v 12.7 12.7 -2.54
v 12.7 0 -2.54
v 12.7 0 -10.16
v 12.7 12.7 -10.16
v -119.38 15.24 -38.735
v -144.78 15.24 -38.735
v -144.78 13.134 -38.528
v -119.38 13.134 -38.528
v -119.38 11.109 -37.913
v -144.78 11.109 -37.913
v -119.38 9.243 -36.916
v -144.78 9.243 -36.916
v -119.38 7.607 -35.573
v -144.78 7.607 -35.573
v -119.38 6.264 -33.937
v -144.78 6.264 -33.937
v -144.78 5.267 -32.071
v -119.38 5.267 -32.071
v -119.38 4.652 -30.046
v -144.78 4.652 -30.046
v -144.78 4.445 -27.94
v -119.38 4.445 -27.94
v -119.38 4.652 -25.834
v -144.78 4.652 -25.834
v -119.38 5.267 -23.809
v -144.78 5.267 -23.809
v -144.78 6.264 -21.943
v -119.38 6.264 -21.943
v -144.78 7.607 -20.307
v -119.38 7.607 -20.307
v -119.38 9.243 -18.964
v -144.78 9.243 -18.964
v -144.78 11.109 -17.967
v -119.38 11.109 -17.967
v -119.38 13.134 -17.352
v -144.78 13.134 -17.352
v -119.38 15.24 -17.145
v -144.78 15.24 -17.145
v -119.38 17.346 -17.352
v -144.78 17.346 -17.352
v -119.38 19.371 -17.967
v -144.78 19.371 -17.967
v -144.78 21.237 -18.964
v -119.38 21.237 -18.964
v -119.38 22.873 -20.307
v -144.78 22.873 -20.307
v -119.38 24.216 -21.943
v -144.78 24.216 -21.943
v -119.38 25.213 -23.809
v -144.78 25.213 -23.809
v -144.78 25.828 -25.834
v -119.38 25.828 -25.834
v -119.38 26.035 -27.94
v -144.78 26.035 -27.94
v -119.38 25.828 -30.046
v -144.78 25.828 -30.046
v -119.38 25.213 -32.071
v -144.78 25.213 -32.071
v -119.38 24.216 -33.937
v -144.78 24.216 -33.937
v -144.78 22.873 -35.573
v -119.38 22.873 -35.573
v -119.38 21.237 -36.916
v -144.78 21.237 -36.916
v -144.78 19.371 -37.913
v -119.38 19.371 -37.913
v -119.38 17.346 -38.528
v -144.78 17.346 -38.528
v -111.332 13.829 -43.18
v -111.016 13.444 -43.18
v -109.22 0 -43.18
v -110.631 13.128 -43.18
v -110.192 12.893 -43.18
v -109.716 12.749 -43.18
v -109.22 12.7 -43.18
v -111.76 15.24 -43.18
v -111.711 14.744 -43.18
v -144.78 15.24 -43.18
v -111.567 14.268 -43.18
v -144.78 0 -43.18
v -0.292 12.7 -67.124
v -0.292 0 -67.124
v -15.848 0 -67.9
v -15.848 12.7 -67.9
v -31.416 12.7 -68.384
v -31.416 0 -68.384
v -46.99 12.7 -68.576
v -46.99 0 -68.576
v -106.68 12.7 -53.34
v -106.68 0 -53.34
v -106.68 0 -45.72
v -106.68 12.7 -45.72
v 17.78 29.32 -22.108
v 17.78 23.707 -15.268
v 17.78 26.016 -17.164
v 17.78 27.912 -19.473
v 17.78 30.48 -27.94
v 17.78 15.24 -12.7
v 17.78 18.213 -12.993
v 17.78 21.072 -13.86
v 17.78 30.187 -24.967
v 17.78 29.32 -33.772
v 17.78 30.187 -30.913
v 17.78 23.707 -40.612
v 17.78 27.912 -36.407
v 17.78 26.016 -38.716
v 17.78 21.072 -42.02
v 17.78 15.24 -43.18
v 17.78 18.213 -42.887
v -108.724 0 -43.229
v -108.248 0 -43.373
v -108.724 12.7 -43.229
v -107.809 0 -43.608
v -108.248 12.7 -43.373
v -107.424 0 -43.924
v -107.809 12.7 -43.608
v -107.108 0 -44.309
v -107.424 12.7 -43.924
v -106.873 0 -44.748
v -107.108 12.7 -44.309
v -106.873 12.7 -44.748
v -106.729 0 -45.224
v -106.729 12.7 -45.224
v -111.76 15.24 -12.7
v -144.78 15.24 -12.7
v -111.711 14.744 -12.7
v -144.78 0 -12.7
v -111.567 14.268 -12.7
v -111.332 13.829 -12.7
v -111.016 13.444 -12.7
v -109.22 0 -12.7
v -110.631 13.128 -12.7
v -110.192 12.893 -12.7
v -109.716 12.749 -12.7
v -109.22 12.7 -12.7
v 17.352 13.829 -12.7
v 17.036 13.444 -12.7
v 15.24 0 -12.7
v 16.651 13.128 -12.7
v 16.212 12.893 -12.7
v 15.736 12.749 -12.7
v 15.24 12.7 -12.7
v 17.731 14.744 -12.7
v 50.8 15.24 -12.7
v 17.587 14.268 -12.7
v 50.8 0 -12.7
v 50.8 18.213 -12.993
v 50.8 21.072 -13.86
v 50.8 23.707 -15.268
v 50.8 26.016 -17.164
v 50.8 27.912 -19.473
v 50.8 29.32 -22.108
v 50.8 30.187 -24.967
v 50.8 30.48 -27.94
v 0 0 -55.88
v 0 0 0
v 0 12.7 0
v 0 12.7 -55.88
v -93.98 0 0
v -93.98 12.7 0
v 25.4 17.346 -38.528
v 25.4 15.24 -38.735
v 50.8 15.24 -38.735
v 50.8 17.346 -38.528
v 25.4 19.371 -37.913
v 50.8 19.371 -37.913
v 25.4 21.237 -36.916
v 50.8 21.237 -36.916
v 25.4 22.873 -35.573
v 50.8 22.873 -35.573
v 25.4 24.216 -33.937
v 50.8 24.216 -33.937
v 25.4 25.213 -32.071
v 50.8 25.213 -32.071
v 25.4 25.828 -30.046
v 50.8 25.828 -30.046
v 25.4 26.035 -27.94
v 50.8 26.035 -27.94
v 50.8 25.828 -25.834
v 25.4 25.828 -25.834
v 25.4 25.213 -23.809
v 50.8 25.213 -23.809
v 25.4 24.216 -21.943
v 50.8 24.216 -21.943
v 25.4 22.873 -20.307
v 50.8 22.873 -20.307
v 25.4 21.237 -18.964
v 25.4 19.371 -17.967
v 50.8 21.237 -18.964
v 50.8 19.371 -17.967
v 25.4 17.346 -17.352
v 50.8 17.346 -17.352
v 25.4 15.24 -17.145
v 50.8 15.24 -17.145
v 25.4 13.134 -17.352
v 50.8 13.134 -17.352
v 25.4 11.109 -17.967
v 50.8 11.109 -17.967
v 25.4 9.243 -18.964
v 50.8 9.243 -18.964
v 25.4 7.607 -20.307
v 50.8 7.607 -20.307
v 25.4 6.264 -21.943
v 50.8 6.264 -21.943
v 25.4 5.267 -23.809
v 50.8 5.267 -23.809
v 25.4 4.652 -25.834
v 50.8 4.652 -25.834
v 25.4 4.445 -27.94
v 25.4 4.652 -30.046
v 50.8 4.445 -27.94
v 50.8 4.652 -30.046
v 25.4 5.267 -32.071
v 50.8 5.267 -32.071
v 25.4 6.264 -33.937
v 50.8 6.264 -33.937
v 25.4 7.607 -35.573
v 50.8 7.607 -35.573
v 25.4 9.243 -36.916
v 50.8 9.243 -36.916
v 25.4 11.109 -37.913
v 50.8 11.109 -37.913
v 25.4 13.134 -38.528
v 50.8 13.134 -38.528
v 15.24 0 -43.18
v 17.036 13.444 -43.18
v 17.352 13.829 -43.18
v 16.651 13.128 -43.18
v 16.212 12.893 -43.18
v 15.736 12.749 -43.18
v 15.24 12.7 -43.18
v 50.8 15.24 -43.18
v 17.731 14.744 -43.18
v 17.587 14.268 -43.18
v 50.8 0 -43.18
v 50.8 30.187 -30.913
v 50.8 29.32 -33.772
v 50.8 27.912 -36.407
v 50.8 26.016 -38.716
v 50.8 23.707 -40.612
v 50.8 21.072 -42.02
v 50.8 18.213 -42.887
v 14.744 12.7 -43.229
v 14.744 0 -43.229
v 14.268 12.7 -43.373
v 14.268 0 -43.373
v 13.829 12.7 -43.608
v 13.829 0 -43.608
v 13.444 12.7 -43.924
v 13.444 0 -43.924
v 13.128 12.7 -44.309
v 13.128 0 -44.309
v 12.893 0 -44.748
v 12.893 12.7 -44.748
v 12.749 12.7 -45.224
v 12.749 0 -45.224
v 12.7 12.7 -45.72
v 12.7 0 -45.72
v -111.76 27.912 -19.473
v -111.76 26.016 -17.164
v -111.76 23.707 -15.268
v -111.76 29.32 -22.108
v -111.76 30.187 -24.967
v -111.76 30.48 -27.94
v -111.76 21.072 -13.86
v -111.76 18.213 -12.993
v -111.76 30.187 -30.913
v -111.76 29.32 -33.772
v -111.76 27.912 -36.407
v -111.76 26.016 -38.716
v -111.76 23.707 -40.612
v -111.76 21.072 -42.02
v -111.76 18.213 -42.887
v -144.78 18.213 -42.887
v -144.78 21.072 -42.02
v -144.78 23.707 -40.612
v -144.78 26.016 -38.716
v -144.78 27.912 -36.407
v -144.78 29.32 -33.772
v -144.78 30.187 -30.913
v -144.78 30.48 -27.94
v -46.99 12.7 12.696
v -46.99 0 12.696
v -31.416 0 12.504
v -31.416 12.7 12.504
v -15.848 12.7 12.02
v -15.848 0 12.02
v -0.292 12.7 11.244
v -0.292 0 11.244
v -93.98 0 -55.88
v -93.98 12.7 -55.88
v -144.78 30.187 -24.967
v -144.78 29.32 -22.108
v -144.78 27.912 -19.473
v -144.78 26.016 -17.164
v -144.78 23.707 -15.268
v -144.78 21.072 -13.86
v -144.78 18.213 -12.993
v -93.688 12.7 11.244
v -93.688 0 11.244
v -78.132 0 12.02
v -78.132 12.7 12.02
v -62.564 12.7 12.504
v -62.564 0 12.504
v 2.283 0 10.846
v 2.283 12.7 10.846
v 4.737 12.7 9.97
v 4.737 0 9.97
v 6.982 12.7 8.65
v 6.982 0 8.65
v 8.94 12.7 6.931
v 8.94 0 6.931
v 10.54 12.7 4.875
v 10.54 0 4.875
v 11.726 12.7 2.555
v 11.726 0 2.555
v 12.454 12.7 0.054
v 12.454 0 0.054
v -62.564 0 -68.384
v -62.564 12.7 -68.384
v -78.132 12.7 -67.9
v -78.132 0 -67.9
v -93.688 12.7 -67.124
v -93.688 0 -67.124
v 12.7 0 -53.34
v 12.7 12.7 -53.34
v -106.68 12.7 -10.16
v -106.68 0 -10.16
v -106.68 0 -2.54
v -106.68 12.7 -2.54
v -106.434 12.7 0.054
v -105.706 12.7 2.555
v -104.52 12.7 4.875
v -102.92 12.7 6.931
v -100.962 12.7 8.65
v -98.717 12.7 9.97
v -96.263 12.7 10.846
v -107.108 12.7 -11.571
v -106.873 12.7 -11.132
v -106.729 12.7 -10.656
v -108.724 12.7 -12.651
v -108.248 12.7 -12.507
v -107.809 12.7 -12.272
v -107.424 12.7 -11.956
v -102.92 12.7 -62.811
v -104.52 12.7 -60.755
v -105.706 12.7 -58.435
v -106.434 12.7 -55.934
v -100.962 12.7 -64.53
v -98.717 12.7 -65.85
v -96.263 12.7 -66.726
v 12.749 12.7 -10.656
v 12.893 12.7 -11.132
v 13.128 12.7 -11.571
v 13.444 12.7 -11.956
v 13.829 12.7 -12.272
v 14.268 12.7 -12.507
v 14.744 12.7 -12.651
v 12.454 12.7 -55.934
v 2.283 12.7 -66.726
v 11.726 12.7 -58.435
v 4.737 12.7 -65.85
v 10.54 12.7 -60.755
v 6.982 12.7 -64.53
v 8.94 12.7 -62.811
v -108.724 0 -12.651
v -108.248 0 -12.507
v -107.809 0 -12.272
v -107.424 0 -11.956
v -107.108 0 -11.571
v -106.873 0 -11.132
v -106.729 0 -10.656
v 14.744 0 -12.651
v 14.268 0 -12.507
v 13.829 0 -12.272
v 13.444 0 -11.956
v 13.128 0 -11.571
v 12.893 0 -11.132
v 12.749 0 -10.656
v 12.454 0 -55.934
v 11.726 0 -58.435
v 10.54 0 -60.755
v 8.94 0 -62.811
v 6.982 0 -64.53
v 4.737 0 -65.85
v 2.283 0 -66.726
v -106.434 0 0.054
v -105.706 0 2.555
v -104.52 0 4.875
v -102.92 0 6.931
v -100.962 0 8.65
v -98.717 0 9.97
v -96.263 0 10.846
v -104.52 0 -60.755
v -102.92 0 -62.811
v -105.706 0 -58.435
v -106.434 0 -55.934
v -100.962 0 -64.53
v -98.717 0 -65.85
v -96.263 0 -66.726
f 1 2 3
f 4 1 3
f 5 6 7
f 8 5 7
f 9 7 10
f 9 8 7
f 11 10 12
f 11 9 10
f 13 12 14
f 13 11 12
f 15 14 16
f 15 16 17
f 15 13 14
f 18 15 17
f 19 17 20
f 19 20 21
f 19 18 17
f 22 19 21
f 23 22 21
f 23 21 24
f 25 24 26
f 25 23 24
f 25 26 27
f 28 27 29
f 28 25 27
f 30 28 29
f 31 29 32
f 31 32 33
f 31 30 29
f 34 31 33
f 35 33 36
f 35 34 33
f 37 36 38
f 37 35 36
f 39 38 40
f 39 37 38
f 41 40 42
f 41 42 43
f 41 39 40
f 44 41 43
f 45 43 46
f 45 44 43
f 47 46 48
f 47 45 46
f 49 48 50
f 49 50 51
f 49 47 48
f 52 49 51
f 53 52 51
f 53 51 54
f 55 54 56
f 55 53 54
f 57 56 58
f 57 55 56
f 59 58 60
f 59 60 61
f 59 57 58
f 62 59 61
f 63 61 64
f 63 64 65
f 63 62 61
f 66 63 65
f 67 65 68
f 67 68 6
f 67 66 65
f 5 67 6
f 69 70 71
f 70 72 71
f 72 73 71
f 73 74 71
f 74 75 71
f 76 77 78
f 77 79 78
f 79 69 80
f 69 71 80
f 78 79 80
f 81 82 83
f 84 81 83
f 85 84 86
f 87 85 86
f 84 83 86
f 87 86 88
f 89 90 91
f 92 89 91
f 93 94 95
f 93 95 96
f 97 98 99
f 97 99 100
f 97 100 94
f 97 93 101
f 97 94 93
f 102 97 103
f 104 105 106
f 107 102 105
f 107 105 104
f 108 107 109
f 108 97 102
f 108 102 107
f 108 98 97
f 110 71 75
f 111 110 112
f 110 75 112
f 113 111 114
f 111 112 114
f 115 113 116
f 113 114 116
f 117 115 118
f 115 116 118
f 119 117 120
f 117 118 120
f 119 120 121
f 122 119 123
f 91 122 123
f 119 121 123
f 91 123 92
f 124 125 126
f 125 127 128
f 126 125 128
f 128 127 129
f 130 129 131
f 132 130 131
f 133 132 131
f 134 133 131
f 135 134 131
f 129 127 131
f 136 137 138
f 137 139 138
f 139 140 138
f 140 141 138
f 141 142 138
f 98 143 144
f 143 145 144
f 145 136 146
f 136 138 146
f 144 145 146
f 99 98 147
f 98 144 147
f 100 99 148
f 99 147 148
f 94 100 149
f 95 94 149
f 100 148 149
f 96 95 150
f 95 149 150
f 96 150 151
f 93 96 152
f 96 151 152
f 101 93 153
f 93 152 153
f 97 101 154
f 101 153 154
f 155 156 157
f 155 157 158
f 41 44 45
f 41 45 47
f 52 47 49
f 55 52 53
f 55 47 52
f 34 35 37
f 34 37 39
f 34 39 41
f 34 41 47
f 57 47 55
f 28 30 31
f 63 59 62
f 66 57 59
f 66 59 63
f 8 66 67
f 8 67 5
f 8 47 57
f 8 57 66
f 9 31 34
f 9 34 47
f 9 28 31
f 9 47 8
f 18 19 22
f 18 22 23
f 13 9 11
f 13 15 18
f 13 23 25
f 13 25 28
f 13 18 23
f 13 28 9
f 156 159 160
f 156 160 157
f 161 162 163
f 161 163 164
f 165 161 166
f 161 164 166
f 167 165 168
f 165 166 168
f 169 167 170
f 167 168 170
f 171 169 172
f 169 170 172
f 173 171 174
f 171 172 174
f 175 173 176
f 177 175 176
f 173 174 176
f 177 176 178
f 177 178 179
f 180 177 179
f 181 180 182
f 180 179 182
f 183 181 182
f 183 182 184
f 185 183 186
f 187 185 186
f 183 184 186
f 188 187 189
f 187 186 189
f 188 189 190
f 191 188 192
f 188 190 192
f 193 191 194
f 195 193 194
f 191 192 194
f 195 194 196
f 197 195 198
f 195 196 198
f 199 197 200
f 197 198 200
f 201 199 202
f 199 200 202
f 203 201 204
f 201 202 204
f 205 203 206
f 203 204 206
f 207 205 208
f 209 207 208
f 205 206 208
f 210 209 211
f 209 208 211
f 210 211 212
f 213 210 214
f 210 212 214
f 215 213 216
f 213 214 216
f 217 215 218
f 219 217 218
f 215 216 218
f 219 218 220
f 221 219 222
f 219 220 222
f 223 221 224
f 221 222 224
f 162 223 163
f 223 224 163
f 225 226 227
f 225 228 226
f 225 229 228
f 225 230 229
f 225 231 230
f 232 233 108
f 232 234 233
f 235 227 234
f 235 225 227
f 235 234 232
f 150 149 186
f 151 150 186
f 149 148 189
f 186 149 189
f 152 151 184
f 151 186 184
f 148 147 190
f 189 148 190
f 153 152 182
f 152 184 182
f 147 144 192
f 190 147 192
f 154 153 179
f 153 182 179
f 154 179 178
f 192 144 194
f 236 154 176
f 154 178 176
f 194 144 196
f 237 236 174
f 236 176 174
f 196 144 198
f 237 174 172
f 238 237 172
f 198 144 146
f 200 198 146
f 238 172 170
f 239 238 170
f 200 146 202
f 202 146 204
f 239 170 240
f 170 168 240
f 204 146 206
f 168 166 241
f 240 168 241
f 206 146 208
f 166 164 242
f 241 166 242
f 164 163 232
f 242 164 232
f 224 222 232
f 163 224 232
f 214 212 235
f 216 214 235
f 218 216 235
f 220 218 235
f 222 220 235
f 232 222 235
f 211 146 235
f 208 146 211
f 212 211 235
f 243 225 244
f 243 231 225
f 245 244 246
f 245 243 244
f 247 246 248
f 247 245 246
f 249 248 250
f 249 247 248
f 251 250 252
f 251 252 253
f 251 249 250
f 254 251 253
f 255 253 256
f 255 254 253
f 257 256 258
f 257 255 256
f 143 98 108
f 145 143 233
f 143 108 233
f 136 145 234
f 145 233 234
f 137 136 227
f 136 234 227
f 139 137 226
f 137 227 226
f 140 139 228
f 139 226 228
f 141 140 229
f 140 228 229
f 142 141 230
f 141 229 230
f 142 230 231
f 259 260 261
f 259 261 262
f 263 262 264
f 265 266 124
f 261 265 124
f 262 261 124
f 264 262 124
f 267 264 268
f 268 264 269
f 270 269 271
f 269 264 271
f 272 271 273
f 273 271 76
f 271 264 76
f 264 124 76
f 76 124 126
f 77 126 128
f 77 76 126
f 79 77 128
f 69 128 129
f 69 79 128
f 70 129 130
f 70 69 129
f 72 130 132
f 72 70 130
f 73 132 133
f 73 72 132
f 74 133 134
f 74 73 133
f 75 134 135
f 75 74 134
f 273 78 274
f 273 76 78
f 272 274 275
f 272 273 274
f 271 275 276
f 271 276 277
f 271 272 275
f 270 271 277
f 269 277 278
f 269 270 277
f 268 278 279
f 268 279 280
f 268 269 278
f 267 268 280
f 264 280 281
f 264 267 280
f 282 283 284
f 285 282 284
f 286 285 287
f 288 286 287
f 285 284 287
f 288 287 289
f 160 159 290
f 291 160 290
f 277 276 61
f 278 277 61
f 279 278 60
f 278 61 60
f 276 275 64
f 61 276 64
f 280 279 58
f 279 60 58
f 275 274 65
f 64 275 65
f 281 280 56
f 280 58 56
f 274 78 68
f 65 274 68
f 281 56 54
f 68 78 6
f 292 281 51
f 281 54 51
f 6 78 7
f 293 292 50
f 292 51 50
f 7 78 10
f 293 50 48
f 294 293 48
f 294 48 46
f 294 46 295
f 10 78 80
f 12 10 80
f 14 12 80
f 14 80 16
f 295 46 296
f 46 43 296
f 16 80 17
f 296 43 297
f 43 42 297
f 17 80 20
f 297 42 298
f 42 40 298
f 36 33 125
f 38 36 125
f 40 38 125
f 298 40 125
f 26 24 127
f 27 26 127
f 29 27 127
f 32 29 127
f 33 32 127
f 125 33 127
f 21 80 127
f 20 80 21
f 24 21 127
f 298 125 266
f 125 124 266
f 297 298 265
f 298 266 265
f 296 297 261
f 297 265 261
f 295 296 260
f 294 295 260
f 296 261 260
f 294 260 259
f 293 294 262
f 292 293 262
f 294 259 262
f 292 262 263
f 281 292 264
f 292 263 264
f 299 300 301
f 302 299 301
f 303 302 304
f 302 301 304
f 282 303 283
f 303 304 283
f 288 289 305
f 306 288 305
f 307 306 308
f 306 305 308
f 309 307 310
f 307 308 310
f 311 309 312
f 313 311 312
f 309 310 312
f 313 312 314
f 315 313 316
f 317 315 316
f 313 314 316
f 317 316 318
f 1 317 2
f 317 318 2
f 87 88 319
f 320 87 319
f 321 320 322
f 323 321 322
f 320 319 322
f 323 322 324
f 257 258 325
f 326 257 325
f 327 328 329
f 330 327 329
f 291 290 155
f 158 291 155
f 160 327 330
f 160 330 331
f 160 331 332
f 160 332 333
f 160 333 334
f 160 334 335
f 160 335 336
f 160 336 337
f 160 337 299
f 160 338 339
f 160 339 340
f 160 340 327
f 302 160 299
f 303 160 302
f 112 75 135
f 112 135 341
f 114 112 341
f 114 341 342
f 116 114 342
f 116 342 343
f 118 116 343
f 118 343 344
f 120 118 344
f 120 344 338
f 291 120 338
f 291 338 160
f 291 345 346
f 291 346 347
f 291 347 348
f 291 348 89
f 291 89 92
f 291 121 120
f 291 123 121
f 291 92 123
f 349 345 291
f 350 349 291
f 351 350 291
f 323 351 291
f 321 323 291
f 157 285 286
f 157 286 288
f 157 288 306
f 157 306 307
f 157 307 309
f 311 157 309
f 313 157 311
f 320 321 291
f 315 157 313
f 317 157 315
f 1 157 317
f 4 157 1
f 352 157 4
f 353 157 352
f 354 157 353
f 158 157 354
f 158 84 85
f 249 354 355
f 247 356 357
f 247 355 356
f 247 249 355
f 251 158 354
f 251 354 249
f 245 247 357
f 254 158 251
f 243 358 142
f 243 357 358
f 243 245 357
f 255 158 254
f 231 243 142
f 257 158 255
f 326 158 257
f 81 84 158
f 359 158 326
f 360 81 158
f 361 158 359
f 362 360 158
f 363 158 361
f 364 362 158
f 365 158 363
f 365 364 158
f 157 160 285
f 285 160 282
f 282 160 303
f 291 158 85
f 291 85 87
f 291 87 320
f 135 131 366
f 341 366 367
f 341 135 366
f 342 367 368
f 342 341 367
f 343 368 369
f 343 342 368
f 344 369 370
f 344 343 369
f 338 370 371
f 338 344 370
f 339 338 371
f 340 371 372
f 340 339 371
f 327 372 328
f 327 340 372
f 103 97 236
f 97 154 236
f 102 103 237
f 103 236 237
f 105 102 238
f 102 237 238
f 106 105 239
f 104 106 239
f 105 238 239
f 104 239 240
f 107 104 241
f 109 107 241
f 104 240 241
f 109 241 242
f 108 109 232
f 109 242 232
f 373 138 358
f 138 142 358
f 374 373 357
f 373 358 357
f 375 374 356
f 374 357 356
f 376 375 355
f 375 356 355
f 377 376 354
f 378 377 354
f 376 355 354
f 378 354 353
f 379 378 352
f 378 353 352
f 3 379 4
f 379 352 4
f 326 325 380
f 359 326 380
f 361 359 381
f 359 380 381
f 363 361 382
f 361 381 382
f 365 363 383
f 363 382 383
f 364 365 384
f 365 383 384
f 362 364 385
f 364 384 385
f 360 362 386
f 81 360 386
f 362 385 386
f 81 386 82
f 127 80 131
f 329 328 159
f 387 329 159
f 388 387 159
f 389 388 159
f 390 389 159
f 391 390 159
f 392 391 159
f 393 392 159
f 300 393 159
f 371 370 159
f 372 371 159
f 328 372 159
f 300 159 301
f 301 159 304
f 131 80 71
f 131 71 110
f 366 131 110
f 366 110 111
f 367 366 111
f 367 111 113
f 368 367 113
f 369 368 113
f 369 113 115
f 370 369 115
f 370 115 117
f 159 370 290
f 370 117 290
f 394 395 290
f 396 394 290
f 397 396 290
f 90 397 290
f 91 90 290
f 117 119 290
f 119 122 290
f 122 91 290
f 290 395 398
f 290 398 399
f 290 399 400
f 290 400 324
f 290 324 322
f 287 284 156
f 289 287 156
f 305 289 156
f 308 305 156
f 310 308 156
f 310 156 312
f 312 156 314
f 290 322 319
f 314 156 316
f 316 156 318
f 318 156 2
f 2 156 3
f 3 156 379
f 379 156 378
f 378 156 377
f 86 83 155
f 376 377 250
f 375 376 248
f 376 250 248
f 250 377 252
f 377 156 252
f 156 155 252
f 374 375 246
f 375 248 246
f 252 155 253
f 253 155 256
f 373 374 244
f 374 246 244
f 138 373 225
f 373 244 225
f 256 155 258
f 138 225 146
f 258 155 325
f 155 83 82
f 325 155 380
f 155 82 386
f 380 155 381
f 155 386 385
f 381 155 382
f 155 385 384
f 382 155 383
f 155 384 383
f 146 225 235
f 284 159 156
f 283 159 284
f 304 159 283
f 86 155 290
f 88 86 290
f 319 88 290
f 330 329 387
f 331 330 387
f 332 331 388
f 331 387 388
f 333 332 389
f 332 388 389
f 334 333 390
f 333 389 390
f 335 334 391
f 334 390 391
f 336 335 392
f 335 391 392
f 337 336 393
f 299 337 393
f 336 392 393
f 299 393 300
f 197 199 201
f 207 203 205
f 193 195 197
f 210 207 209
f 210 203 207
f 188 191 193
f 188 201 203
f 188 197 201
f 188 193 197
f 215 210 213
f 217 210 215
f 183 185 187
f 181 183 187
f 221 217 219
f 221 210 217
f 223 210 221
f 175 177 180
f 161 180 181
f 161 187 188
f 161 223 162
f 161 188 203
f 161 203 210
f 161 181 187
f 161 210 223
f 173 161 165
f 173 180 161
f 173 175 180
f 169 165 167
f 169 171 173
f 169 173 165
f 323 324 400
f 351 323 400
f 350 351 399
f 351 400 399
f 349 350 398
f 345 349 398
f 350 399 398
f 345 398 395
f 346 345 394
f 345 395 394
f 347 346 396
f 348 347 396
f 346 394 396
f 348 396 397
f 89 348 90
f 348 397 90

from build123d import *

# Parameters (mm, degrees)
SKETCH2_W           = 93.98
SKETCH2_H           = 55.88
BOSS_EXTRUDE1_DEPTH = 12.7
SKETCH3_W           = 33.02
SKETCH3_H           = 30.48
BOSS_EXTRUDE2_DEPTH = 17.78
FILLET1_R           = 2.54
SKETCH4_R           = 10.795
CUT_EXTRUDE1_DEPTH  = 25.4
CUT_EXTRUDE2_START  = -25.4
SKETCH5_R           = 10.795
CUT_EXTRUDE2_DEPTH  = 25.4
FILLET2_R           = 2.54
FILLET3_R           = 15.24


with BuildPart() as part:
    # Sketch2 → Boss-Extrude1 (new body)
    with BuildSketch(Plane(origin=(0, 0, 0), x_dir=(1, 0, 0), z_dir=(0, 1, 0))):
        with BuildLine():
            ThreePointArc((-93.688069253, -11.244332686), (-70.349230661, -12.298232488), (-46.99, -12.696270789))
            ThreePointArc((-46.99, -12.696270789), (-23.630769339, -12.298232488), (-0.291930747, -11.244332686))
            ThreePointArc((-0.291930747, -11.244332686), (8.940138318, -6.930983214), (12.7, 2.54))
            Line((12.7, 2.54), (12.7, 12.7))
            Line((12.7, 12.7), (50.8, 12.7))
            Line((50.8, 12.7), (50.8, 43.18))
            Line((50.8, 43.18), (12.7, 43.18))
            Line((12.7, 43.18), (12.7, 53.34))
            ThreePointArc((12.7, 53.34), (8.940138318, 62.810983214), (-0.291930747, 67.124332686))
            ThreePointArc((-0.291930747, 67.124332686), (-23.630769339, 68.178232488), (-46.99, 68.576270789))
            ThreePointArc((-46.99, 68.576270789), (-70.349230661, 68.178232488), (-93.688069253, 67.124332686))
            ThreePointArc((-93.688069253, 67.124332686), (-102.920138318, 62.810983214), (-106.68, 53.34))
            Line((-106.68, 53.34), (-106.68, 43.18))
            Line((-106.68, 43.18), (-144.78, 43.18))
            Line((-144.78, 43.18), (-144.78, 12.7))
            Line((-144.78, 12.7), (-106.68, 12.7))
            Line((-106.68, 12.7), (-106.68, 2.54))
            ThreePointArc((-106.68, 2.54), (-102.920138318, -6.930983214), (-93.688069253, -11.244332686))
        make_face()
        with Locations((-46.99, 27.94)):
            Rectangle(SKETCH2_W, SKETCH2_H, mode=Mode.SUBTRACT)
    extrude(amount=BOSS_EXTRUDE1_DEPTH)

    # Sketch3 → Boss-Extrude2 (add)
    with BuildSketch(Plane(origin=(0, 12.7, 0), x_dir=(1, 0, 0), z_dir=(0, 1, 0))):
        with Locations((34.29, 27.94)):
            Rectangle(SKETCH3_W, SKETCH3_H)
        with Locations((-128.27, 27.94)):
            Rectangle(SKETCH3_W, SKETCH3_H)
    extrude(amount=BOSS_EXTRUDE2_DEPTH)

    # Fillet1
    fillet1_edges = [part.edges().sort_by_distance(p)[0] for p in [
        (17.78, 12.7, -27.94),
        (-111.76, 12.7, -27.94),
    ]]
    fillet(fillet1_edges, radius=FILLET1_R)

    # Sketch4 → Cut-Extrude1 (cut)
    with BuildSketch(Plane(origin=(50.8, 0, 0), x_dir=(0, 0, -1), z_dir=(1, 0, 0))):
        with Locations((27.94, 15.24)):
            Circle(SKETCH4_R)
    extrude(amount=-CUT_EXTRUDE1_DEPTH, mode=Mode.SUBTRACT)

    # Sketch5 → Cut-Extrude2 (cut)
    with BuildSketch(Plane.ZY.offset(144.78).offset(CUT_EXTRUDE2_START)):
        with Locations(Location((-27.94, 15.24, 0), (0, 0, 180))):
            Circle(SKETCH5_R)
    extrude(amount=CUT_EXTRUDE2_DEPTH, mode=Mode.SUBTRACT)

    # Fillet2
    fillet2_edges = [part.edges().sort_by_distance(p)[0] for p in [
        (12.7, 6.35, -43.18),
        (12.7, 6.35, -12.7),
        (-106.68, 6.35, -43.18),
        (-106.68, 6.35, -12.7),
    ]]
    fillet(fillet2_edges, radius=FILLET2_R)

    # Fillet3
    fillet3_edges = [part.edges().sort_by_distance(p)[0] for p in [
        (34.29, 30.48, -43.18),
        (34.29, 30.48, -12.7),
        (-128.27, 30.48, -43.18),
        (-128.27, 30.48, -12.7),
    ]]
    fillet(fillet3_edges, radius=FILLET3_R - 0.0001)  # a hair under: the kernel refuses the full size


solid = part.part
